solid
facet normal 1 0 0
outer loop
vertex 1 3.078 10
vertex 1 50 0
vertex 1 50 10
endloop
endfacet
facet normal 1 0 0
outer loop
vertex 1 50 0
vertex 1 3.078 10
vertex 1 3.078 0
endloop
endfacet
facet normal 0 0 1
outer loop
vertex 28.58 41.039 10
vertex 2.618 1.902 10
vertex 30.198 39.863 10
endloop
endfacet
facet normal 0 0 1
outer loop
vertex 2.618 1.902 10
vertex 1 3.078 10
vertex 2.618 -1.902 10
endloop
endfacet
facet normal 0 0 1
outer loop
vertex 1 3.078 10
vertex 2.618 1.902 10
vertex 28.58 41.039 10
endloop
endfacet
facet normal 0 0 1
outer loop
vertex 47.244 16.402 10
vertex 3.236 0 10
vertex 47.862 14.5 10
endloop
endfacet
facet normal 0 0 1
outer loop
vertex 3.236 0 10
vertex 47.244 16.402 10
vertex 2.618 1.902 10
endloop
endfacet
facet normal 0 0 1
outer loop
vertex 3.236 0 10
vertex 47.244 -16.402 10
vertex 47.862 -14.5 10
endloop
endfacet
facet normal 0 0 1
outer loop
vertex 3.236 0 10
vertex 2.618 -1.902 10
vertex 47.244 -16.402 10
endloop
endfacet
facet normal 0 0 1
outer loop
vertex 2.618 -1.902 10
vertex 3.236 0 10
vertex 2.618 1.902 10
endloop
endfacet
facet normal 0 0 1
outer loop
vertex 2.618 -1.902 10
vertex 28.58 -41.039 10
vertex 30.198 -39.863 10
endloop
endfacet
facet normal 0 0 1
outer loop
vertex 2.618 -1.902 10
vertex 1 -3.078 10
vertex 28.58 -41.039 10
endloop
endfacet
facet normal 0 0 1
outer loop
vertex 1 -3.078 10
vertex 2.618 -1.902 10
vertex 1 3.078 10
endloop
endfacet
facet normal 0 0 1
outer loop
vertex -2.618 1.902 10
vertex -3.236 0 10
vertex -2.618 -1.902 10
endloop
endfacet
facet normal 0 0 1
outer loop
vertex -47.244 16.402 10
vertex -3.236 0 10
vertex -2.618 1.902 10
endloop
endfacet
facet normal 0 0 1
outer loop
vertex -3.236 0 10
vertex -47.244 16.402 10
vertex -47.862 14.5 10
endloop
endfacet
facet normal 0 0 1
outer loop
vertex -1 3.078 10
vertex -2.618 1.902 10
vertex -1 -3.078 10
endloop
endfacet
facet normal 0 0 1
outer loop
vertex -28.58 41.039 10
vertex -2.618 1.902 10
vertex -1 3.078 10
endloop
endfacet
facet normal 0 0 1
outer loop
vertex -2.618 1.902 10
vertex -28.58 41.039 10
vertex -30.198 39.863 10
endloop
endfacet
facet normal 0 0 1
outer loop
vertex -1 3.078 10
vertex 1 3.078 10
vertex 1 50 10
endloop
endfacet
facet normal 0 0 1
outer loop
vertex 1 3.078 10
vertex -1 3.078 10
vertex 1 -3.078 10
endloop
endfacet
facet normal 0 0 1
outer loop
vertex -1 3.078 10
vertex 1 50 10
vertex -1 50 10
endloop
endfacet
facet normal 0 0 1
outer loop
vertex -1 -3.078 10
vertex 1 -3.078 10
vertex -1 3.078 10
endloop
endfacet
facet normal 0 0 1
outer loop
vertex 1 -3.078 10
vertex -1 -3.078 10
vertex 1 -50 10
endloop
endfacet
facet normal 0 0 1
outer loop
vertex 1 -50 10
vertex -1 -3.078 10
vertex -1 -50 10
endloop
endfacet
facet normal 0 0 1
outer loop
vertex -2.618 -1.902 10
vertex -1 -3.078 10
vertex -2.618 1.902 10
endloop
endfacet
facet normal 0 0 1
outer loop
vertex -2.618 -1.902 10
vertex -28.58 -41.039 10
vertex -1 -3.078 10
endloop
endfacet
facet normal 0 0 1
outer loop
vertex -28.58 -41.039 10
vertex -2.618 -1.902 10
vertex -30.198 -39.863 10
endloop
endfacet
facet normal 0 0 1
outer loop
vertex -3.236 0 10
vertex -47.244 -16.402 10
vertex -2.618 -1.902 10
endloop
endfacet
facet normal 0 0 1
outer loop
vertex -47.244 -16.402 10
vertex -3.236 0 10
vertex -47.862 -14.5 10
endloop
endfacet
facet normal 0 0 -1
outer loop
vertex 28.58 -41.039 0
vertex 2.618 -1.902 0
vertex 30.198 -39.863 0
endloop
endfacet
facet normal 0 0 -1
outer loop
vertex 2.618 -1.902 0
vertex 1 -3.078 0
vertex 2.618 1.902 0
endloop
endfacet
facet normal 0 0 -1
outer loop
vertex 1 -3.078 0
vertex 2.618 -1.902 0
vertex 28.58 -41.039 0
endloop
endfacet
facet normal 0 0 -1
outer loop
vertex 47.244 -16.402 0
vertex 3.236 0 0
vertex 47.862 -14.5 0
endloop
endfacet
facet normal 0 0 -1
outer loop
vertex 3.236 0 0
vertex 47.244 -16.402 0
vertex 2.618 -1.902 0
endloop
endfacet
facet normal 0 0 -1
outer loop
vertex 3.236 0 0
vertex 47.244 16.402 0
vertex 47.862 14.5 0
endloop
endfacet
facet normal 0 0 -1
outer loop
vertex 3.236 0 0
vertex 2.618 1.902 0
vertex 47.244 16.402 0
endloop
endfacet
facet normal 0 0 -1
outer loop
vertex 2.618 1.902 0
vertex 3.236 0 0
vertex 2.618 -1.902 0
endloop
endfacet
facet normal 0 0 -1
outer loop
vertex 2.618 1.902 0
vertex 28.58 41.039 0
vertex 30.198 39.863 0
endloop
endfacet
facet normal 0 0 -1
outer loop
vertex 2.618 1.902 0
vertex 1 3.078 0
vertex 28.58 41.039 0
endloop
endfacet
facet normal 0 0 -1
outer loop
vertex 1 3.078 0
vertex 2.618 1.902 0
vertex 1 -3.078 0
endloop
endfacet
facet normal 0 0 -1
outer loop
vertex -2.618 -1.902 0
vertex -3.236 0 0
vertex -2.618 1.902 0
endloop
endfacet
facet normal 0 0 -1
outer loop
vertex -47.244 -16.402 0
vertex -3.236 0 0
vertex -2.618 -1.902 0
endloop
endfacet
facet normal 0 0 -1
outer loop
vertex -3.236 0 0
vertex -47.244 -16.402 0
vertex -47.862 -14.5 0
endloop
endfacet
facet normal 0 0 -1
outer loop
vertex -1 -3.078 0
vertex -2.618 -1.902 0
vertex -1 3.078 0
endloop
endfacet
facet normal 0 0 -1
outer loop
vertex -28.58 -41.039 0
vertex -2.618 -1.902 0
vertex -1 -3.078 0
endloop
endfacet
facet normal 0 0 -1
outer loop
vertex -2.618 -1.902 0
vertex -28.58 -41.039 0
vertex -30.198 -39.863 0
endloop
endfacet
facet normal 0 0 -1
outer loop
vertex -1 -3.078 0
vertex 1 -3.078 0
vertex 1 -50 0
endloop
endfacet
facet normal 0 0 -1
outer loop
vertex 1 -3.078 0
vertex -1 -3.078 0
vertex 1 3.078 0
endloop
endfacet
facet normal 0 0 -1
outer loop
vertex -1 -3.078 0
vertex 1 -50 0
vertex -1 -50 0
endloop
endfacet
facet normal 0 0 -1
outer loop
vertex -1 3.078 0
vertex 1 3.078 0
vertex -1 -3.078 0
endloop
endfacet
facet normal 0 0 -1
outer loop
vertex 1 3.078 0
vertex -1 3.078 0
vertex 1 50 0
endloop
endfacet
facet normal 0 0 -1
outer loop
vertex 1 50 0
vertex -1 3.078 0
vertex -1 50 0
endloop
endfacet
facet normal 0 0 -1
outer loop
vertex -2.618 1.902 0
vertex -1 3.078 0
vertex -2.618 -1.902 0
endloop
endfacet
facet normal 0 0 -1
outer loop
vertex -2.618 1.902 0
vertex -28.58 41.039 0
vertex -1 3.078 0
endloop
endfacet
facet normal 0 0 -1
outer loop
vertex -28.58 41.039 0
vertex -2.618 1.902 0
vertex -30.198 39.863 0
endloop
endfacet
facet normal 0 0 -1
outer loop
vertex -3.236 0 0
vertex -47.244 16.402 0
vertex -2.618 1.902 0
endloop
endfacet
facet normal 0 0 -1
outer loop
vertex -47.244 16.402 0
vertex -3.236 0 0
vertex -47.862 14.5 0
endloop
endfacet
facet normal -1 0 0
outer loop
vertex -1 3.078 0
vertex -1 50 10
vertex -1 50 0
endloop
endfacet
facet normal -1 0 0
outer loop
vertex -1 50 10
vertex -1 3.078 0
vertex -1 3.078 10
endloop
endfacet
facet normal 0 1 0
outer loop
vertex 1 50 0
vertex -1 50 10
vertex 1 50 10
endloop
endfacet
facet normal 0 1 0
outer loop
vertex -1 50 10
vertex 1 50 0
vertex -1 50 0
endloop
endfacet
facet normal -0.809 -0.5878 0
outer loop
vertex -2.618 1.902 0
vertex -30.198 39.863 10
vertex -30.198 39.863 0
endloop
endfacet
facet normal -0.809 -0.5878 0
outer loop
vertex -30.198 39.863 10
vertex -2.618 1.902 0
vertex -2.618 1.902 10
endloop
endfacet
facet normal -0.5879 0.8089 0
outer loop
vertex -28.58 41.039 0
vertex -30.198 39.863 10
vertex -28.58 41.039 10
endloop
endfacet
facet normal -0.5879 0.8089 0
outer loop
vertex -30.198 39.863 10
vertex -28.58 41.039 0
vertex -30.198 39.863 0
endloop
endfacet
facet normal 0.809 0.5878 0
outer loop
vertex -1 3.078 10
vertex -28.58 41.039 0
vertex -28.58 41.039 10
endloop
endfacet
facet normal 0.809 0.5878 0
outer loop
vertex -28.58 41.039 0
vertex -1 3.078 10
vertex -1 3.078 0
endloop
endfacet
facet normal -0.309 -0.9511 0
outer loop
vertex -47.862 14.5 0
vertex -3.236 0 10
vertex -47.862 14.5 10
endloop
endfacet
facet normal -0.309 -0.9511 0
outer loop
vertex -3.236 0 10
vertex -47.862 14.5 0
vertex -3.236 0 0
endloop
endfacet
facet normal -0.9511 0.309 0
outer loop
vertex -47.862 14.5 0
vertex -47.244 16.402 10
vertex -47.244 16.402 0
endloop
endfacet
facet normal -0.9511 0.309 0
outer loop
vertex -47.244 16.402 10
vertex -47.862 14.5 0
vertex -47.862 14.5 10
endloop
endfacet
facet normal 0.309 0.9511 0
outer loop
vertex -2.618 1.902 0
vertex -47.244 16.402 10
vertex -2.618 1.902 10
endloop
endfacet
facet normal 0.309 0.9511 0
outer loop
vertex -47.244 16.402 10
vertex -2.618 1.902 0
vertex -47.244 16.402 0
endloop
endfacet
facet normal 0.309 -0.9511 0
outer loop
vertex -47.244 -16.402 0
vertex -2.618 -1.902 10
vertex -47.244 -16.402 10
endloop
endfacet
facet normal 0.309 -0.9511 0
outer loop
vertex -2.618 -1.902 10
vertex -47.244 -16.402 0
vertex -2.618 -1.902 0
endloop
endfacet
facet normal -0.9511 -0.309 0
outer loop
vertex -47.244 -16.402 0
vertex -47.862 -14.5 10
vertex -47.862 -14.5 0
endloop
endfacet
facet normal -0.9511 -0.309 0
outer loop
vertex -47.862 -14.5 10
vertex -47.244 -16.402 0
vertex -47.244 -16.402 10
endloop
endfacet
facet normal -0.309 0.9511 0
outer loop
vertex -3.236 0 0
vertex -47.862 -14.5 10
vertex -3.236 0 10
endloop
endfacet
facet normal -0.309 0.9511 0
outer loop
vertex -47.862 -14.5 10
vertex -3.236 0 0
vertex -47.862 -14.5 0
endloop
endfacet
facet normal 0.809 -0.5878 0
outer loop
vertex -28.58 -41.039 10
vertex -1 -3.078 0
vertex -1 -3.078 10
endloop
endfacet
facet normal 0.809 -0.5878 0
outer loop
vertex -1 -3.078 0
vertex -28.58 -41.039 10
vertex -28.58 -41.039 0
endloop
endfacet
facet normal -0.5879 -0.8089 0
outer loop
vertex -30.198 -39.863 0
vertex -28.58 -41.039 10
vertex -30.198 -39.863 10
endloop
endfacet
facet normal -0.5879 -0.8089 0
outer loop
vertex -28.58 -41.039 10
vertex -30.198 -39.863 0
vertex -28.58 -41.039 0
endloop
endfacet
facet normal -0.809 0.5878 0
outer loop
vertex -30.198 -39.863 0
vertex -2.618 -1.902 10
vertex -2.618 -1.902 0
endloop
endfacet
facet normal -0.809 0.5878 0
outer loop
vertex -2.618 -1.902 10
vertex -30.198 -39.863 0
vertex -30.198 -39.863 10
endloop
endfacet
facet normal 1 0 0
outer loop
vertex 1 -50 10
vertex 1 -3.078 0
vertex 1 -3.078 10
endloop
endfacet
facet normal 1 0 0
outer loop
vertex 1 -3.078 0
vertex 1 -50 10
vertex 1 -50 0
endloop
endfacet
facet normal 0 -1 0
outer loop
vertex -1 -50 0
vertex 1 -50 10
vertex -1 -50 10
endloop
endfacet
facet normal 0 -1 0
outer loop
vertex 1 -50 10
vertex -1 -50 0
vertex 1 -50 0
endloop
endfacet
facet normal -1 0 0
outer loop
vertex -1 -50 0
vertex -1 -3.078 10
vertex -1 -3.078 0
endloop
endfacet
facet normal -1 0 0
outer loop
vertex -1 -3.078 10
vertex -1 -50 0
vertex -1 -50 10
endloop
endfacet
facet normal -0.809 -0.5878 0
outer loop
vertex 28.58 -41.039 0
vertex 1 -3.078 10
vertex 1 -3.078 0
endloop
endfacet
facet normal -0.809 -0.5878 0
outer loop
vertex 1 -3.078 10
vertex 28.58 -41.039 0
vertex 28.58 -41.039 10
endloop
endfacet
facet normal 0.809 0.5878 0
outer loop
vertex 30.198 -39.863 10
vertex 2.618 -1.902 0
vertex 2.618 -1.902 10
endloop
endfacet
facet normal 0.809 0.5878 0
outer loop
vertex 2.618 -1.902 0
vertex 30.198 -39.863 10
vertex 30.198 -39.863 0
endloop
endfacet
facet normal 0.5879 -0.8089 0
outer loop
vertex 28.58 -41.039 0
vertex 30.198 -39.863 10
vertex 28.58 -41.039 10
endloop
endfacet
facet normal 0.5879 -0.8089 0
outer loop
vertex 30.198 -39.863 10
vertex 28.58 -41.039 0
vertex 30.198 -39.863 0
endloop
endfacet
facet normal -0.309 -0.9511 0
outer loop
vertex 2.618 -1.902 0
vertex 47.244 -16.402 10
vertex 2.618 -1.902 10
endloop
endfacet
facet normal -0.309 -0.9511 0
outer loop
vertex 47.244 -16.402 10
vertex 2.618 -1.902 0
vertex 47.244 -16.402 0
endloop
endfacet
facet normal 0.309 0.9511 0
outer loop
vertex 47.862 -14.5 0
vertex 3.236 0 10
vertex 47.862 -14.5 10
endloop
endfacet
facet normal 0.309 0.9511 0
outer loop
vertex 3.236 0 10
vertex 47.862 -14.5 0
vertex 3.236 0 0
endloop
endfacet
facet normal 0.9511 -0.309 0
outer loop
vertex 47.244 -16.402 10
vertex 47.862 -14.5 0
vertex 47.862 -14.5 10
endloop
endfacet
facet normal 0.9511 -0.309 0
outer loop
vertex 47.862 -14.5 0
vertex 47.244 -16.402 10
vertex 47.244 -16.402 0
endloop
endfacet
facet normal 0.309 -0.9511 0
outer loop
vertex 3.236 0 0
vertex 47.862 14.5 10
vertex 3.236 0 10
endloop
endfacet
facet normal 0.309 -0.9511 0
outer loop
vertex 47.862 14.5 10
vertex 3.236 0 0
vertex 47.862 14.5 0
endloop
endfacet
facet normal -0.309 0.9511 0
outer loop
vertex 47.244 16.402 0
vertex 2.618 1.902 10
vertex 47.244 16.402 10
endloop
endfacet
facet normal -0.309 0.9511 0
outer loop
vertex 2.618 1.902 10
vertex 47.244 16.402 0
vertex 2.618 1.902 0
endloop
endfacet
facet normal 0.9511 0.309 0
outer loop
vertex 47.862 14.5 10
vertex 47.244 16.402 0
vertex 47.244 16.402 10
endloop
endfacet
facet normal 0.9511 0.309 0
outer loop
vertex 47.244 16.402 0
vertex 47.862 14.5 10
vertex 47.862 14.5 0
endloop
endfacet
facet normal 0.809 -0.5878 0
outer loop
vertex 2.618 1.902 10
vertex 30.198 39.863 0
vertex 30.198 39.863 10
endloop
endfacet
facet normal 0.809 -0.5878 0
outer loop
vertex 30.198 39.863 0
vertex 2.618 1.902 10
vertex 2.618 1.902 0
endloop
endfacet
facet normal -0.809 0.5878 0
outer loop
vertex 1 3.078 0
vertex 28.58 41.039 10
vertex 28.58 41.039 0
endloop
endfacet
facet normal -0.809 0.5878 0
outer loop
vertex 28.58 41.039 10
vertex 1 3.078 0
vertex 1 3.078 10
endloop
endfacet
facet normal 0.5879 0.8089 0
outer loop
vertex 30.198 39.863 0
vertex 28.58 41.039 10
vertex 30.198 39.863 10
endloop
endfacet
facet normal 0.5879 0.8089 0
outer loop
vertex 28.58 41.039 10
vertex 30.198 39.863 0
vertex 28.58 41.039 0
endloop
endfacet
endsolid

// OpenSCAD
radius = 50;
wall_t = 2;
wall_h = 10;
slices = 10;

slice_angle = 360 / slices;

for (slice = [1 : slices]) {
  rotate([0, 0, slice_angle * (slice - 1)])
    translate([-wall_t / 2, 0, 0])
    cube(size = [wall_t, radius, wall_h], center=false);
}
